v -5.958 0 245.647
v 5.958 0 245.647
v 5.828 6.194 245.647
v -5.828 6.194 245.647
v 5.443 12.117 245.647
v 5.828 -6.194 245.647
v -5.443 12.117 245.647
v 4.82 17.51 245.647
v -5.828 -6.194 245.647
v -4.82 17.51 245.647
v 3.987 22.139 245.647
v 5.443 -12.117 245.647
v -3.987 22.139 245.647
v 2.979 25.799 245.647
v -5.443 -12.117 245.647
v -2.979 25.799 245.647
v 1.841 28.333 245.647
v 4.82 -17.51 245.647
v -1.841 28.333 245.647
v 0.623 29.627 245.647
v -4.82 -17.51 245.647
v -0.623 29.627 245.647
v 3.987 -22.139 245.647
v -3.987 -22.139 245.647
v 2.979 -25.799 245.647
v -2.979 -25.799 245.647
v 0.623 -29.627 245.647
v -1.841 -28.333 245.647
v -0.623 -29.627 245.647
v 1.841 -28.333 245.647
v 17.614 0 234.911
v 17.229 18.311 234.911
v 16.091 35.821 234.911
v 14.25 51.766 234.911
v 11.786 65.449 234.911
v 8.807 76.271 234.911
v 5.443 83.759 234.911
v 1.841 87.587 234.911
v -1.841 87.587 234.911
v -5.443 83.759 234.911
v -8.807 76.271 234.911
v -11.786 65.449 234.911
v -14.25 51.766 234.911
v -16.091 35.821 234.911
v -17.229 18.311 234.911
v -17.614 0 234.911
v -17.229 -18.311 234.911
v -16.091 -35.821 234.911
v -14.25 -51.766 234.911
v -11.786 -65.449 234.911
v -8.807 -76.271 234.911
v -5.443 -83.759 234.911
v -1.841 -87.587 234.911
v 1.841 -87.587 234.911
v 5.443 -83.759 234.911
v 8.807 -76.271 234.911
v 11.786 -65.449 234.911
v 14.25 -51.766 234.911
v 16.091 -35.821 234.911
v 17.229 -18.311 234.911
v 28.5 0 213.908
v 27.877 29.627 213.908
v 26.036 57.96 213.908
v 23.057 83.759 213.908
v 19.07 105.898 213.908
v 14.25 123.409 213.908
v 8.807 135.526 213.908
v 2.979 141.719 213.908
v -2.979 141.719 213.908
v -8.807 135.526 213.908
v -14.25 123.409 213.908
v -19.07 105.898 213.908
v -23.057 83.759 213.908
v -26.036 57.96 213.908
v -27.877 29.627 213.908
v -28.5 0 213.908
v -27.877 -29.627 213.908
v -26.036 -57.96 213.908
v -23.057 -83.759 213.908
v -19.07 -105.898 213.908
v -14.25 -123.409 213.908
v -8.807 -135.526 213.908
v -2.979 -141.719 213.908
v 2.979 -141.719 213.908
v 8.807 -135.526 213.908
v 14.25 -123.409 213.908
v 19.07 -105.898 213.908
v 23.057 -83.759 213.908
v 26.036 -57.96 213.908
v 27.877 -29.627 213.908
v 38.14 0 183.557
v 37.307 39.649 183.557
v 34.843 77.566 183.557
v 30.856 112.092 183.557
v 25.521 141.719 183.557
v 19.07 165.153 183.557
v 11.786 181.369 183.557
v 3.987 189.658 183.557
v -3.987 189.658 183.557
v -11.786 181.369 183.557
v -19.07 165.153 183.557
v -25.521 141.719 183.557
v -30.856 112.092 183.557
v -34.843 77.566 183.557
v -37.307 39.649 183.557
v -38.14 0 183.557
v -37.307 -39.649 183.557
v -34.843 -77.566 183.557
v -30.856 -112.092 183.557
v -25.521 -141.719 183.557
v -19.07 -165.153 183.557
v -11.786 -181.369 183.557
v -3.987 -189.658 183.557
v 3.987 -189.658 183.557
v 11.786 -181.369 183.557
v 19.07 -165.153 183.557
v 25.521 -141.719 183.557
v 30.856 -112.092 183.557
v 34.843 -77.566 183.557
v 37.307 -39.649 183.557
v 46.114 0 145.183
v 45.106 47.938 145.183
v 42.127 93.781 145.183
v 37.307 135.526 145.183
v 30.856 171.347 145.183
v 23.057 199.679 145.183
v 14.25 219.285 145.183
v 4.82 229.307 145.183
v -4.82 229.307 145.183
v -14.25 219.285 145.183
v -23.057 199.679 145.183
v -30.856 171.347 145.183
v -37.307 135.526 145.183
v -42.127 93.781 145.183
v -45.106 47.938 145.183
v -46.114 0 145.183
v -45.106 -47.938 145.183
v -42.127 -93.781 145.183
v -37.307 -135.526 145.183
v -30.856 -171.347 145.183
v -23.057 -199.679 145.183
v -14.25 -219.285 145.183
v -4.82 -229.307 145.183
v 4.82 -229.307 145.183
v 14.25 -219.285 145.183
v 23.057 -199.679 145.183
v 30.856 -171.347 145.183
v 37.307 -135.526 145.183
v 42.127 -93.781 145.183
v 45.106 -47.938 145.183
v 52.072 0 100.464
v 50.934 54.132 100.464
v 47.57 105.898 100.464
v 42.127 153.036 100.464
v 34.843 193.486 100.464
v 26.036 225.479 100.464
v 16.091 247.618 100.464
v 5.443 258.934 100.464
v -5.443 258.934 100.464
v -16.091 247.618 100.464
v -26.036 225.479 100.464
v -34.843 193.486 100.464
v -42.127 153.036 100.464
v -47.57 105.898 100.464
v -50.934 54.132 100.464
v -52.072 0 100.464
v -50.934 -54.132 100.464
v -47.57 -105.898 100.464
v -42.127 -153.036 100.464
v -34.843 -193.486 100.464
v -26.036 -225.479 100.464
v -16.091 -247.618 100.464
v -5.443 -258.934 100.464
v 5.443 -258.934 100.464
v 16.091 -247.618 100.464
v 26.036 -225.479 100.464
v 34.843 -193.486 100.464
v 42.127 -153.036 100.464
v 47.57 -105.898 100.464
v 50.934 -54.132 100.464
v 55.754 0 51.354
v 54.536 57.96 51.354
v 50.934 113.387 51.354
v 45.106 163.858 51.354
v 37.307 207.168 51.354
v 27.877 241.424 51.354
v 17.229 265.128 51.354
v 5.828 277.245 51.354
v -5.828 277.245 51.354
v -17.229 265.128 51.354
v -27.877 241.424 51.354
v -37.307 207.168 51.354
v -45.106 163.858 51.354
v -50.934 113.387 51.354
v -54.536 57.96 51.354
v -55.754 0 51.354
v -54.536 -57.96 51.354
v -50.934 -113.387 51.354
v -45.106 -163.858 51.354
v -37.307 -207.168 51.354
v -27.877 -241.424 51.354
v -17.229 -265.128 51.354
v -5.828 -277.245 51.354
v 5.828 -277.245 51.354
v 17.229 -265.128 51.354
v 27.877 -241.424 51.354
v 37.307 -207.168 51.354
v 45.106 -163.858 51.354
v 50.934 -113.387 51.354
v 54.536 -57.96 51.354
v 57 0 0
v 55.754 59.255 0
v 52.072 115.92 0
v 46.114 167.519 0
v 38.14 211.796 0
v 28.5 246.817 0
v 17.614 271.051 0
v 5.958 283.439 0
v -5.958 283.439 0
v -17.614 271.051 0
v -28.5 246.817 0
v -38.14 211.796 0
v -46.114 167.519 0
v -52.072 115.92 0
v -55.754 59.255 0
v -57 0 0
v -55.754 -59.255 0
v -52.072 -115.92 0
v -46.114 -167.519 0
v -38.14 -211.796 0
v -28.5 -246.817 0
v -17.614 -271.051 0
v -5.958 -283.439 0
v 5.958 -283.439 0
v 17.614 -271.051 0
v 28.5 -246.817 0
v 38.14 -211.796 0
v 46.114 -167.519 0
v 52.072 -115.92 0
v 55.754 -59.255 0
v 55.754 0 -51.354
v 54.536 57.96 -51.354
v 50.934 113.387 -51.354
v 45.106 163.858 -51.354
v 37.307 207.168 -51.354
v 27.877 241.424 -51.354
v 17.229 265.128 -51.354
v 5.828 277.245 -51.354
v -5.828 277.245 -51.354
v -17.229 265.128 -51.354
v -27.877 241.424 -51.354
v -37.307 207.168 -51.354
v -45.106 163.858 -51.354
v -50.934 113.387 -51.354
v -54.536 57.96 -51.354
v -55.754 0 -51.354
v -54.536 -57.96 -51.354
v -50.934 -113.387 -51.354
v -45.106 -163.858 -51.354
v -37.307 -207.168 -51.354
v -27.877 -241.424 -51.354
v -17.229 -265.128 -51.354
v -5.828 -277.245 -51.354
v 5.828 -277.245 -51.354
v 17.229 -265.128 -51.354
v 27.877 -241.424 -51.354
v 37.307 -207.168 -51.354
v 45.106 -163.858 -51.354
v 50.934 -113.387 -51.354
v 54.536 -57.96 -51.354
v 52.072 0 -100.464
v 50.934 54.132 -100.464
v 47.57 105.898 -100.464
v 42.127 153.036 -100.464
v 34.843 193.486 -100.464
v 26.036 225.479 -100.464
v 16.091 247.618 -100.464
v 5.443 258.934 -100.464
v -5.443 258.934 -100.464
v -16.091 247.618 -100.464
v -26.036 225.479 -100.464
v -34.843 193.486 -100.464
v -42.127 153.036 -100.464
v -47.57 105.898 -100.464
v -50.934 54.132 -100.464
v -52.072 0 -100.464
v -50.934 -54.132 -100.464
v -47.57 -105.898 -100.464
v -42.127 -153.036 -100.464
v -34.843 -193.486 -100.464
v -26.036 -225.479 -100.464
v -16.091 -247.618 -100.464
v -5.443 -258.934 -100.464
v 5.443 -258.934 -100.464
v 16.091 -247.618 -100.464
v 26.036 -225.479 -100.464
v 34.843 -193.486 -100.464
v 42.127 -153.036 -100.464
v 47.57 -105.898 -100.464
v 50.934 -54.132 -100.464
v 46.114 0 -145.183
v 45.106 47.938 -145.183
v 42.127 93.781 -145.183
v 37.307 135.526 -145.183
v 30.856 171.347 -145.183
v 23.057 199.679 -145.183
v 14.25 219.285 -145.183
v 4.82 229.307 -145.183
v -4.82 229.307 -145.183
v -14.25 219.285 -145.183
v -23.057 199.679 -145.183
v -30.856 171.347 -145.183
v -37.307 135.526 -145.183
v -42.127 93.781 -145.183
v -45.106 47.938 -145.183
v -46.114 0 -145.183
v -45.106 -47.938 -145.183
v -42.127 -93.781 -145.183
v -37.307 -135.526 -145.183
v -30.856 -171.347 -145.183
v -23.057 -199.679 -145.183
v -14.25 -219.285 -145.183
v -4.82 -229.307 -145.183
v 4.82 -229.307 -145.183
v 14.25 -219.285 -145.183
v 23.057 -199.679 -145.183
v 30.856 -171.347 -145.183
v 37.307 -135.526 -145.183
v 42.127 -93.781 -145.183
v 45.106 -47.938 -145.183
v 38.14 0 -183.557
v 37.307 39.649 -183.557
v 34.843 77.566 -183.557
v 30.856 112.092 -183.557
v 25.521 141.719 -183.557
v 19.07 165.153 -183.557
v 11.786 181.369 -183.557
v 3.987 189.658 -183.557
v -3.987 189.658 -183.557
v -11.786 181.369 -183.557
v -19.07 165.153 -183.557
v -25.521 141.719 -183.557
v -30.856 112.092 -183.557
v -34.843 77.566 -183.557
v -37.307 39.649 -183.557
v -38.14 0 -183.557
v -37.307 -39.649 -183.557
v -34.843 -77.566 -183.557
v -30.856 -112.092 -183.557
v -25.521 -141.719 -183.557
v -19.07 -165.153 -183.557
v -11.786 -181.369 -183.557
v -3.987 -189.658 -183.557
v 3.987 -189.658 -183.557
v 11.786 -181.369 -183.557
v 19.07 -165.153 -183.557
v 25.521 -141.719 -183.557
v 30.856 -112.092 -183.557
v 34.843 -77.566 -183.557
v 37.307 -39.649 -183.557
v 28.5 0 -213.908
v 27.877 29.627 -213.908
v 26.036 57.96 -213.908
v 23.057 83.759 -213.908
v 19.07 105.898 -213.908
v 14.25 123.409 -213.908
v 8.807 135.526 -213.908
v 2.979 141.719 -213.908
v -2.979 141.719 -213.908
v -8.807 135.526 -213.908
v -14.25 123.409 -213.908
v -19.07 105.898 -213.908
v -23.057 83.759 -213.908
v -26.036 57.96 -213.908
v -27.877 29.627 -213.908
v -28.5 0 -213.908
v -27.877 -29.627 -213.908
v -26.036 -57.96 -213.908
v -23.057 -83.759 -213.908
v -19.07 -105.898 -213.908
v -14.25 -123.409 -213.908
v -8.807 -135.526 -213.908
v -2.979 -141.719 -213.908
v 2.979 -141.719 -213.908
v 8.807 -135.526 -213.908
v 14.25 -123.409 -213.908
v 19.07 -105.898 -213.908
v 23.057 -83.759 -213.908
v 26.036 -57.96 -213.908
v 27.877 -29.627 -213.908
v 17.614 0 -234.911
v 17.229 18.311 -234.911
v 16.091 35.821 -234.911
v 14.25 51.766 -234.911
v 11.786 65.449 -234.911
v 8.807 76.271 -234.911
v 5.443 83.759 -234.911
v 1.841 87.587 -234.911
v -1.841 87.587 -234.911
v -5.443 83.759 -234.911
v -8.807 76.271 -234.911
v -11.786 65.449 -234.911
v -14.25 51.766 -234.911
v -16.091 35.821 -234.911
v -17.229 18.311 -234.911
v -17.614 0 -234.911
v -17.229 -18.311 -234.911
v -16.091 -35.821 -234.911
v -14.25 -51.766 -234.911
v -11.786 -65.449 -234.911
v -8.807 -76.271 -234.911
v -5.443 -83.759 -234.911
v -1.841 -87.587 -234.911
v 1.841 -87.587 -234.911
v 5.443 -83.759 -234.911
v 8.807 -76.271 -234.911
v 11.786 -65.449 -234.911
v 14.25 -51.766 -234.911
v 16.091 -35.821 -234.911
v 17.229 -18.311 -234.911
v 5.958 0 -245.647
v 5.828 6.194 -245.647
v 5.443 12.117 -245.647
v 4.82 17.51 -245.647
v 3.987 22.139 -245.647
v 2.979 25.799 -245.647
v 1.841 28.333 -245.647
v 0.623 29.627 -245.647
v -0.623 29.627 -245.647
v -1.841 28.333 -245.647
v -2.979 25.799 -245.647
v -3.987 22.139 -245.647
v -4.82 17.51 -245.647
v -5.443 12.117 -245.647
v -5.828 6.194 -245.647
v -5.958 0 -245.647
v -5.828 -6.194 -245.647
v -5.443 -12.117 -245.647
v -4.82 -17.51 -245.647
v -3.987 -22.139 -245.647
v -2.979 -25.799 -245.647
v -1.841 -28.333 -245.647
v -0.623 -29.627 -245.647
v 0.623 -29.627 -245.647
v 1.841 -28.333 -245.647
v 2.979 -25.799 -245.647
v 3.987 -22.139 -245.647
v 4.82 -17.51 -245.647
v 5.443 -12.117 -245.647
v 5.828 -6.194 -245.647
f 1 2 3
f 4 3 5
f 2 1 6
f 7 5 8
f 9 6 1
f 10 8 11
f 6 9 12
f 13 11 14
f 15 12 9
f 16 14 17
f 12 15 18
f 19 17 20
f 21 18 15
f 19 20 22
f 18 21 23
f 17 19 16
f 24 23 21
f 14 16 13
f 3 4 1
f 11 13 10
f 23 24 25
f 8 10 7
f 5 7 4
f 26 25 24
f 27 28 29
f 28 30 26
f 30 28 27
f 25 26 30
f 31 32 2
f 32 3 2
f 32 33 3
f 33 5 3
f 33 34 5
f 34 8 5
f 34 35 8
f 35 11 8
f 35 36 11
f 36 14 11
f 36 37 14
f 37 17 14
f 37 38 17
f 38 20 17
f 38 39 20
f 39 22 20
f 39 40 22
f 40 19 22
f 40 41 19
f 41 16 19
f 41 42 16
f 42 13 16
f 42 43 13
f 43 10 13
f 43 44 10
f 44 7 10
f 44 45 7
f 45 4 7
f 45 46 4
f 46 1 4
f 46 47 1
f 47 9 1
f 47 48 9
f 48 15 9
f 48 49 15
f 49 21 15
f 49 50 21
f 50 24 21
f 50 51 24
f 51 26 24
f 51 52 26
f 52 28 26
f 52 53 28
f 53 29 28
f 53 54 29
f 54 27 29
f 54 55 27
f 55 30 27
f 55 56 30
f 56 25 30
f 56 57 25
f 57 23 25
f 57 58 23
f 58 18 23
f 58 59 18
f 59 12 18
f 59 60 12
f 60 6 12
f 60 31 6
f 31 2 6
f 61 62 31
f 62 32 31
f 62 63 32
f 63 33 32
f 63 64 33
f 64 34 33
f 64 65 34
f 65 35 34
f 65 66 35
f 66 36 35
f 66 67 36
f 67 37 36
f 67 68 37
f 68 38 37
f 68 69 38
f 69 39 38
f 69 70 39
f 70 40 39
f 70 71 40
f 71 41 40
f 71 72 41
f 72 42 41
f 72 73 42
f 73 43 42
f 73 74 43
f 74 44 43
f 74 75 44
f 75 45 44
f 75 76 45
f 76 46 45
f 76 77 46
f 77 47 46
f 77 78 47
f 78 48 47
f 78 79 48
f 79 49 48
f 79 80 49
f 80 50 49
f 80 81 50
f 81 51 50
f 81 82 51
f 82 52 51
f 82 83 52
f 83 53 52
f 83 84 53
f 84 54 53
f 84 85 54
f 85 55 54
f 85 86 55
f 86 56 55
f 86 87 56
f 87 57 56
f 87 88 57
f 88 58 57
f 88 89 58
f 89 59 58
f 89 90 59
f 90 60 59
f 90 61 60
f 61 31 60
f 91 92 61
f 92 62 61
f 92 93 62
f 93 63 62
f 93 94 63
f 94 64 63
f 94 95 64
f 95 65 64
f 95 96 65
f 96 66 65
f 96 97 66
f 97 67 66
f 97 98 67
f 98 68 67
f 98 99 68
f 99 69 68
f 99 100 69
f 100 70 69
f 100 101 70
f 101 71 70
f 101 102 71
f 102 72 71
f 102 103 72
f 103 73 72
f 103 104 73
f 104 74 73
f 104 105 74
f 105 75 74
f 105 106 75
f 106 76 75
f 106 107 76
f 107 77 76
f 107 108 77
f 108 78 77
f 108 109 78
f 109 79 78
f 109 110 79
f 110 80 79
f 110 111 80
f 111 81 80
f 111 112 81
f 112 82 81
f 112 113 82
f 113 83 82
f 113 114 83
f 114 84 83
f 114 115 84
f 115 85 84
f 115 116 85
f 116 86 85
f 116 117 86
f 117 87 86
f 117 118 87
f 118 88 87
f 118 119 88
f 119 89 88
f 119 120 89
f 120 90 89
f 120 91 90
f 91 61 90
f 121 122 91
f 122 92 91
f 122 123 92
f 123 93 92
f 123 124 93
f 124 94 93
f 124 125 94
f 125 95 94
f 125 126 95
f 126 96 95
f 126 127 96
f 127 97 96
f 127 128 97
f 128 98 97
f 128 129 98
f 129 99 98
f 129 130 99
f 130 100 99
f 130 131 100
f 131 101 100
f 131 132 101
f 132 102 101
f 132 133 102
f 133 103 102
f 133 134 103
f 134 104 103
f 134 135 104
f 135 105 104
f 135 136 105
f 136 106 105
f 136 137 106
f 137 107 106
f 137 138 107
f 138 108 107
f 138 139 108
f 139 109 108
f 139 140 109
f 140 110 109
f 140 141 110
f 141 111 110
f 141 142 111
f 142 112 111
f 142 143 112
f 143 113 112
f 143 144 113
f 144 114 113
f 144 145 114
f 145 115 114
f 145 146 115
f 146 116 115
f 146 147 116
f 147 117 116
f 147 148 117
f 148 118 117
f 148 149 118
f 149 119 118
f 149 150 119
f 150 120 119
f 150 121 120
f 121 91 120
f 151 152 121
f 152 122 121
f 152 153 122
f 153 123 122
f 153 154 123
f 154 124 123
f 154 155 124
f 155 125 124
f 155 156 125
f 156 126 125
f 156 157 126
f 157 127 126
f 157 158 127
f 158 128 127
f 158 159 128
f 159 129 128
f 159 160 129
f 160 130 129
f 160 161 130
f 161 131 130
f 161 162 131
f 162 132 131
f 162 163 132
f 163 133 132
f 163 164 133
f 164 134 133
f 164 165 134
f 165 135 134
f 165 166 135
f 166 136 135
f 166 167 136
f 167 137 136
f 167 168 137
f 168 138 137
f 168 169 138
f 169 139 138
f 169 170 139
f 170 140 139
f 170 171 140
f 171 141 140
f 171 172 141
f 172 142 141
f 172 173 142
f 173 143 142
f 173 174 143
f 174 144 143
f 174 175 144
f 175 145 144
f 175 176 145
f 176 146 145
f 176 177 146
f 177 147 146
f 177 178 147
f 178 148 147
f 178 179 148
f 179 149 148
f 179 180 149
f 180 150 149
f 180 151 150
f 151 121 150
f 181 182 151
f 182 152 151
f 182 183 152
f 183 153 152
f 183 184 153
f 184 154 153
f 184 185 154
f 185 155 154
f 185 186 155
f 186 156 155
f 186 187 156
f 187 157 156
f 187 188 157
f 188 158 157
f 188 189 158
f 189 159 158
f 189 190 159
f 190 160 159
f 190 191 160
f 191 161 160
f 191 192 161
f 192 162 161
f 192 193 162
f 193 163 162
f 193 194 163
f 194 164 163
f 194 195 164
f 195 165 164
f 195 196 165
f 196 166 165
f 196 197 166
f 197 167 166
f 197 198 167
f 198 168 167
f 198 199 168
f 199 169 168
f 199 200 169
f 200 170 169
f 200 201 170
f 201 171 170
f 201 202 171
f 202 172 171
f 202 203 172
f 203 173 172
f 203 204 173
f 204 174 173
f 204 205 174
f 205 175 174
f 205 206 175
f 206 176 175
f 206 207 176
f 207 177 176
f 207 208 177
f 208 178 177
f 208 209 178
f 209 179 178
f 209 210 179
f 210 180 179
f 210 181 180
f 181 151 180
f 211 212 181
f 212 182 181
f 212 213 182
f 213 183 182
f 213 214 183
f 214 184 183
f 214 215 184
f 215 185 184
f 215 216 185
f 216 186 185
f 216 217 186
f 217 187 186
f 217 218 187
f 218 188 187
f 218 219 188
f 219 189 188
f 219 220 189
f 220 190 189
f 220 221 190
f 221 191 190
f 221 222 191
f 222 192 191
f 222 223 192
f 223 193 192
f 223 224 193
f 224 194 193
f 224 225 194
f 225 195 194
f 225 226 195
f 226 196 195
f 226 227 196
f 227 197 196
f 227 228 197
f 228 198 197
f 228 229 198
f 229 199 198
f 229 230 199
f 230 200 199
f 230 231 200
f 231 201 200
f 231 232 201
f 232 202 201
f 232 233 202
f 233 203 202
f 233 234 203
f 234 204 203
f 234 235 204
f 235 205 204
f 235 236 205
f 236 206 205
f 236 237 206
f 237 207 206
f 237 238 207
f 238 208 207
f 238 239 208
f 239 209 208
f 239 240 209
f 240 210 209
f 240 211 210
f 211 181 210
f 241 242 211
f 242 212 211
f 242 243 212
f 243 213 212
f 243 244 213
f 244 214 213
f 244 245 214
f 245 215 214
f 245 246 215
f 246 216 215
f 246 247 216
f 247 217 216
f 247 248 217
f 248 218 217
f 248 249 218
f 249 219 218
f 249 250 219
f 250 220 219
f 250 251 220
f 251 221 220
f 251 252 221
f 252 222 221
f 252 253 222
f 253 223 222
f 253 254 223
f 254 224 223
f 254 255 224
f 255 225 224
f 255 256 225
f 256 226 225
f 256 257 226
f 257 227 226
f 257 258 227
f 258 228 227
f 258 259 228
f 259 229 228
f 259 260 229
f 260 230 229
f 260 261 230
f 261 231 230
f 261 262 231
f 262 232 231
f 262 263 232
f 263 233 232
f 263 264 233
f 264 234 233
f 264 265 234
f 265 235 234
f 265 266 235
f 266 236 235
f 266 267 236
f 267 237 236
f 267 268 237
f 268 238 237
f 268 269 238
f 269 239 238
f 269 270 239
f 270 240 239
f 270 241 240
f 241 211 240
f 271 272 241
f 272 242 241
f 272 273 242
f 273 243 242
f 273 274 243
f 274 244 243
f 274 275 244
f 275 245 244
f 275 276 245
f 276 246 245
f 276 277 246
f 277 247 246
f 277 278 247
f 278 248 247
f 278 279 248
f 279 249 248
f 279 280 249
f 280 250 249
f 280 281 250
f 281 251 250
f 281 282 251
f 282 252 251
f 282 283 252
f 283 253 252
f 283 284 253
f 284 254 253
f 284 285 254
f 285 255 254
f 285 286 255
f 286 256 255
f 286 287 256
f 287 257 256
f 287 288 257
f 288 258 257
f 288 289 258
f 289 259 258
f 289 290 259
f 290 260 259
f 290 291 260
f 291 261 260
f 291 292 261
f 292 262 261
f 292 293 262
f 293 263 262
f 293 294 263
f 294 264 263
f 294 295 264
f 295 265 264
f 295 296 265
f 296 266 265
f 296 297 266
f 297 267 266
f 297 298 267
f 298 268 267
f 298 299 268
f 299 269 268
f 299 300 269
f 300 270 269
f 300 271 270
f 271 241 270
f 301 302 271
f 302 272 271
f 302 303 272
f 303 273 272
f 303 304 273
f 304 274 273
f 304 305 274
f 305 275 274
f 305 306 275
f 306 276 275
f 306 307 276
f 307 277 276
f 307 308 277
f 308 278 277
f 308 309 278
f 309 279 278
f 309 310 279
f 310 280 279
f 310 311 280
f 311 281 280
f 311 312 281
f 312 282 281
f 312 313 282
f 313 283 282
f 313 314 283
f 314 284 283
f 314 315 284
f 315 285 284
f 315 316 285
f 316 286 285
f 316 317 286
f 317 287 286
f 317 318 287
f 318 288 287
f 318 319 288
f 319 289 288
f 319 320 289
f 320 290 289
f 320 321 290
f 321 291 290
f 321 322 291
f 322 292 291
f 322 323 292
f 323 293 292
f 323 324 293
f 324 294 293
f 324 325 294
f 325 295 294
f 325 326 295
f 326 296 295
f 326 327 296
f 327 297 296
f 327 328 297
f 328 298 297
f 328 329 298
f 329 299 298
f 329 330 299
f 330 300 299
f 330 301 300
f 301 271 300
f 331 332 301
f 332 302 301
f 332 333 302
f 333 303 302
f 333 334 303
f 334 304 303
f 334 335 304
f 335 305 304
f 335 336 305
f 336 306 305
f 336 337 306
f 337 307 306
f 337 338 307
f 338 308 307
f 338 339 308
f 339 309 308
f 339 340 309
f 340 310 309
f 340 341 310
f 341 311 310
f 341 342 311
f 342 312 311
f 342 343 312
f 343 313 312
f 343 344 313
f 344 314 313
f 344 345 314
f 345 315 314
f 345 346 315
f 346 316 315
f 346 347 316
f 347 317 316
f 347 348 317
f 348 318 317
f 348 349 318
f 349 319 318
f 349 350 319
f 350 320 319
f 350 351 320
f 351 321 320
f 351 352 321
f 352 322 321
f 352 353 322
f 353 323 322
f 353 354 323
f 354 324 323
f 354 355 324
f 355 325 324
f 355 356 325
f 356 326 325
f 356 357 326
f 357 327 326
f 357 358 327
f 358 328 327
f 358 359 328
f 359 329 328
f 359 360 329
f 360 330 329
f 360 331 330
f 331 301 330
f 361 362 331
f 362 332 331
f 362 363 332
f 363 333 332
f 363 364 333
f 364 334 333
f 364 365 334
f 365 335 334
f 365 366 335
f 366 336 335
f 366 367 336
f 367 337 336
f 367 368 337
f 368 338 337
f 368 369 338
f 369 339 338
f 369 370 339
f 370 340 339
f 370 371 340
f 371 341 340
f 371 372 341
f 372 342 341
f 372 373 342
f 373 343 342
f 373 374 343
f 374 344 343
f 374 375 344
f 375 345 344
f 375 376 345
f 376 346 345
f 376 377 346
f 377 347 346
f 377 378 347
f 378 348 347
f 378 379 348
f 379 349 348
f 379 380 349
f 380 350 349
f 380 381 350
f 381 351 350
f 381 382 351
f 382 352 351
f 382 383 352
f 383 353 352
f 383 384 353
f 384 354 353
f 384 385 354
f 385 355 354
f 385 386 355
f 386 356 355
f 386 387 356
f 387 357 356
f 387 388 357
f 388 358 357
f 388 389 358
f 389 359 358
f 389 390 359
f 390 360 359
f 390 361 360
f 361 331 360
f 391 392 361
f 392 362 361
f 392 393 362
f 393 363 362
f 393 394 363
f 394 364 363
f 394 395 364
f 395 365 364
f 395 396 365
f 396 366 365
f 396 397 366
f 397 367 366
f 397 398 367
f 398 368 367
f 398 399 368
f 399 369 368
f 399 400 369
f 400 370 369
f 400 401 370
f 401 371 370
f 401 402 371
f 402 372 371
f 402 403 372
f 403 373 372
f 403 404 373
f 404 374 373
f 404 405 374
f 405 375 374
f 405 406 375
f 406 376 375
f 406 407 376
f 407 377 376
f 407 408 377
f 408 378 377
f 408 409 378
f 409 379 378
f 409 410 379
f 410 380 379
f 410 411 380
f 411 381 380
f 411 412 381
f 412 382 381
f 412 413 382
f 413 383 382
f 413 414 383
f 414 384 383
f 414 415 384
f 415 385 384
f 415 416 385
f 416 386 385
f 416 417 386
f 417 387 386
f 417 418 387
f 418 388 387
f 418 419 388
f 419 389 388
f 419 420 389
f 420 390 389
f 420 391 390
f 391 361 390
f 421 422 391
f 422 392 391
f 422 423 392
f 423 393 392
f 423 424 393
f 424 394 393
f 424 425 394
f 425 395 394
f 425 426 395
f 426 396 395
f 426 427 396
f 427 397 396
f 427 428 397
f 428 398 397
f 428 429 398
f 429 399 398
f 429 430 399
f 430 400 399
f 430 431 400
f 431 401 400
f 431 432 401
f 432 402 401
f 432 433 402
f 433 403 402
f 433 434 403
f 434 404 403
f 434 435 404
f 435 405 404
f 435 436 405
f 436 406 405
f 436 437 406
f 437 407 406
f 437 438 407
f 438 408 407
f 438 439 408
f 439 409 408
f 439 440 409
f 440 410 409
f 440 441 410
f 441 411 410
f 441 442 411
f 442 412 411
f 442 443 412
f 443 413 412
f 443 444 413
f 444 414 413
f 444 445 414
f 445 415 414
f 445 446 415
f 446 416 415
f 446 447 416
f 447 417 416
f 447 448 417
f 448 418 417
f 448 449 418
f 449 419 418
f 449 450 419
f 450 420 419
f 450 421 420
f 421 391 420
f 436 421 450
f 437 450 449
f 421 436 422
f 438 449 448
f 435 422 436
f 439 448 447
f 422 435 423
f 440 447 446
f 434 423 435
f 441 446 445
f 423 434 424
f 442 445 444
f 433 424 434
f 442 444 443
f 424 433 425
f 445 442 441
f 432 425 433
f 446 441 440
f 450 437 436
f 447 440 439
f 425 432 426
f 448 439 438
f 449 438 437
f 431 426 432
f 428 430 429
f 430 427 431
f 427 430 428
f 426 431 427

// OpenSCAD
// Generated by SolidPython 1.0.1 on 2020-07-29 00:46:45


scale(v = [3, 15, 13]) {
	sphere(r = 19);
}
/***********************************************
*********      SolidPython code:      **********
************************************************
 
# import packages: SolidPython
from solid import *
from solid.utils import *
from itertools import chain, combinations, permutations


class Resize:

    def __init__(self, scad_file):
        self.scad_file = scad_file
        #self.scad_file = import_scad(scad_file)
        # cone/cylinder param:
        self.r1 = 0
        self.r2 = 0
        self.h = 0
        # rectangular prism param:
        self.w = 0
        self.l = 0
        # ellipse param:
        self.r = 0

    # import OpenScad code (file name corresponds to shape)


    # classify shape + parameters
    def assign(self, param1, param2, param3):
        if self.scad_file == 'cone.scad':
            self.r1 = param1
            self.r2 = param2
            self.h = param3
        elif self.scad_file == 'cylinder.scad':
            self.r1 = param1
            self.r2 = param2
            self.h = param3
        elif self.scad_file == 'rectangularPrism.scad':
            self.h = param1
            self.l = param2
            self.w = param3
        else:
            self.r = param1
            self.h = param2

    # resize parameters
    def iterate(self):
        x = range(3, 20, 2)
        i = 1
        if self.scad_file == 'cone.scad':
            tempList = list(permutations(x, 2))
            for temp in tempList:
                param1 = temp[0]
                param2 = temp[1]
                filepath = 'produced_scad_files/' + 'cone' + str(param1) + '_' + str(param2) + '_' + '.scad'
                scad_render_to_file(cylinder(h=param1, r1=param2, r2=0), filepath)

        elif self.scad_file == 'cylinder.scad':
            tempList = list(permutations(x, 3))
            for temp in tempList:
                param1 = temp[0]
                param2 = temp[1]
                filepath = 'produced_scad_files/' + 'cylinder' + str(param1) + '_' + str(param2) + '_' + '.scad'
                scad_render_to_file(cylinder(h=param1, r1=param2, r2=param2), filepath)

        elif self.scad_file == 'rectangularPrism.scad':
            tempList = list(permutations(x, 3))
            for temp in tempList:
                param1 = temp[0]
                param2 = temp[1]
                param3 = temp[2]
                filepath = 'produced_scad_files/' + 'rectangularPrism' + str(param1) + '_' + str(param2) + '_' + str(
                    param3) + '.scad'
                scad_render_to_file(cube(size=(param1, param2, param3)), filepath)

        elif self.scad_file == 'ellipse.scad':
            tempList = list(permutations(x, 4))
            for temp in tempList:
                param1 = temp[0]
                param2 = temp[1]
                param3 = temp[2]
                param4 = temp[3]
                filepath = 'produced_scad_files/' + 'ellipse' + str(param1) + '_' + str(param2) + '_' + str(param3) + '_' + str(param4) + '.scad'
                scad_render_to_file(scale([param1, param2, param3])(sphere(r=param4)), filepath)

    def render_to_scadfile(self):
        scad_render_to_file(scad, 'example.scad') 
 
************************************************/
